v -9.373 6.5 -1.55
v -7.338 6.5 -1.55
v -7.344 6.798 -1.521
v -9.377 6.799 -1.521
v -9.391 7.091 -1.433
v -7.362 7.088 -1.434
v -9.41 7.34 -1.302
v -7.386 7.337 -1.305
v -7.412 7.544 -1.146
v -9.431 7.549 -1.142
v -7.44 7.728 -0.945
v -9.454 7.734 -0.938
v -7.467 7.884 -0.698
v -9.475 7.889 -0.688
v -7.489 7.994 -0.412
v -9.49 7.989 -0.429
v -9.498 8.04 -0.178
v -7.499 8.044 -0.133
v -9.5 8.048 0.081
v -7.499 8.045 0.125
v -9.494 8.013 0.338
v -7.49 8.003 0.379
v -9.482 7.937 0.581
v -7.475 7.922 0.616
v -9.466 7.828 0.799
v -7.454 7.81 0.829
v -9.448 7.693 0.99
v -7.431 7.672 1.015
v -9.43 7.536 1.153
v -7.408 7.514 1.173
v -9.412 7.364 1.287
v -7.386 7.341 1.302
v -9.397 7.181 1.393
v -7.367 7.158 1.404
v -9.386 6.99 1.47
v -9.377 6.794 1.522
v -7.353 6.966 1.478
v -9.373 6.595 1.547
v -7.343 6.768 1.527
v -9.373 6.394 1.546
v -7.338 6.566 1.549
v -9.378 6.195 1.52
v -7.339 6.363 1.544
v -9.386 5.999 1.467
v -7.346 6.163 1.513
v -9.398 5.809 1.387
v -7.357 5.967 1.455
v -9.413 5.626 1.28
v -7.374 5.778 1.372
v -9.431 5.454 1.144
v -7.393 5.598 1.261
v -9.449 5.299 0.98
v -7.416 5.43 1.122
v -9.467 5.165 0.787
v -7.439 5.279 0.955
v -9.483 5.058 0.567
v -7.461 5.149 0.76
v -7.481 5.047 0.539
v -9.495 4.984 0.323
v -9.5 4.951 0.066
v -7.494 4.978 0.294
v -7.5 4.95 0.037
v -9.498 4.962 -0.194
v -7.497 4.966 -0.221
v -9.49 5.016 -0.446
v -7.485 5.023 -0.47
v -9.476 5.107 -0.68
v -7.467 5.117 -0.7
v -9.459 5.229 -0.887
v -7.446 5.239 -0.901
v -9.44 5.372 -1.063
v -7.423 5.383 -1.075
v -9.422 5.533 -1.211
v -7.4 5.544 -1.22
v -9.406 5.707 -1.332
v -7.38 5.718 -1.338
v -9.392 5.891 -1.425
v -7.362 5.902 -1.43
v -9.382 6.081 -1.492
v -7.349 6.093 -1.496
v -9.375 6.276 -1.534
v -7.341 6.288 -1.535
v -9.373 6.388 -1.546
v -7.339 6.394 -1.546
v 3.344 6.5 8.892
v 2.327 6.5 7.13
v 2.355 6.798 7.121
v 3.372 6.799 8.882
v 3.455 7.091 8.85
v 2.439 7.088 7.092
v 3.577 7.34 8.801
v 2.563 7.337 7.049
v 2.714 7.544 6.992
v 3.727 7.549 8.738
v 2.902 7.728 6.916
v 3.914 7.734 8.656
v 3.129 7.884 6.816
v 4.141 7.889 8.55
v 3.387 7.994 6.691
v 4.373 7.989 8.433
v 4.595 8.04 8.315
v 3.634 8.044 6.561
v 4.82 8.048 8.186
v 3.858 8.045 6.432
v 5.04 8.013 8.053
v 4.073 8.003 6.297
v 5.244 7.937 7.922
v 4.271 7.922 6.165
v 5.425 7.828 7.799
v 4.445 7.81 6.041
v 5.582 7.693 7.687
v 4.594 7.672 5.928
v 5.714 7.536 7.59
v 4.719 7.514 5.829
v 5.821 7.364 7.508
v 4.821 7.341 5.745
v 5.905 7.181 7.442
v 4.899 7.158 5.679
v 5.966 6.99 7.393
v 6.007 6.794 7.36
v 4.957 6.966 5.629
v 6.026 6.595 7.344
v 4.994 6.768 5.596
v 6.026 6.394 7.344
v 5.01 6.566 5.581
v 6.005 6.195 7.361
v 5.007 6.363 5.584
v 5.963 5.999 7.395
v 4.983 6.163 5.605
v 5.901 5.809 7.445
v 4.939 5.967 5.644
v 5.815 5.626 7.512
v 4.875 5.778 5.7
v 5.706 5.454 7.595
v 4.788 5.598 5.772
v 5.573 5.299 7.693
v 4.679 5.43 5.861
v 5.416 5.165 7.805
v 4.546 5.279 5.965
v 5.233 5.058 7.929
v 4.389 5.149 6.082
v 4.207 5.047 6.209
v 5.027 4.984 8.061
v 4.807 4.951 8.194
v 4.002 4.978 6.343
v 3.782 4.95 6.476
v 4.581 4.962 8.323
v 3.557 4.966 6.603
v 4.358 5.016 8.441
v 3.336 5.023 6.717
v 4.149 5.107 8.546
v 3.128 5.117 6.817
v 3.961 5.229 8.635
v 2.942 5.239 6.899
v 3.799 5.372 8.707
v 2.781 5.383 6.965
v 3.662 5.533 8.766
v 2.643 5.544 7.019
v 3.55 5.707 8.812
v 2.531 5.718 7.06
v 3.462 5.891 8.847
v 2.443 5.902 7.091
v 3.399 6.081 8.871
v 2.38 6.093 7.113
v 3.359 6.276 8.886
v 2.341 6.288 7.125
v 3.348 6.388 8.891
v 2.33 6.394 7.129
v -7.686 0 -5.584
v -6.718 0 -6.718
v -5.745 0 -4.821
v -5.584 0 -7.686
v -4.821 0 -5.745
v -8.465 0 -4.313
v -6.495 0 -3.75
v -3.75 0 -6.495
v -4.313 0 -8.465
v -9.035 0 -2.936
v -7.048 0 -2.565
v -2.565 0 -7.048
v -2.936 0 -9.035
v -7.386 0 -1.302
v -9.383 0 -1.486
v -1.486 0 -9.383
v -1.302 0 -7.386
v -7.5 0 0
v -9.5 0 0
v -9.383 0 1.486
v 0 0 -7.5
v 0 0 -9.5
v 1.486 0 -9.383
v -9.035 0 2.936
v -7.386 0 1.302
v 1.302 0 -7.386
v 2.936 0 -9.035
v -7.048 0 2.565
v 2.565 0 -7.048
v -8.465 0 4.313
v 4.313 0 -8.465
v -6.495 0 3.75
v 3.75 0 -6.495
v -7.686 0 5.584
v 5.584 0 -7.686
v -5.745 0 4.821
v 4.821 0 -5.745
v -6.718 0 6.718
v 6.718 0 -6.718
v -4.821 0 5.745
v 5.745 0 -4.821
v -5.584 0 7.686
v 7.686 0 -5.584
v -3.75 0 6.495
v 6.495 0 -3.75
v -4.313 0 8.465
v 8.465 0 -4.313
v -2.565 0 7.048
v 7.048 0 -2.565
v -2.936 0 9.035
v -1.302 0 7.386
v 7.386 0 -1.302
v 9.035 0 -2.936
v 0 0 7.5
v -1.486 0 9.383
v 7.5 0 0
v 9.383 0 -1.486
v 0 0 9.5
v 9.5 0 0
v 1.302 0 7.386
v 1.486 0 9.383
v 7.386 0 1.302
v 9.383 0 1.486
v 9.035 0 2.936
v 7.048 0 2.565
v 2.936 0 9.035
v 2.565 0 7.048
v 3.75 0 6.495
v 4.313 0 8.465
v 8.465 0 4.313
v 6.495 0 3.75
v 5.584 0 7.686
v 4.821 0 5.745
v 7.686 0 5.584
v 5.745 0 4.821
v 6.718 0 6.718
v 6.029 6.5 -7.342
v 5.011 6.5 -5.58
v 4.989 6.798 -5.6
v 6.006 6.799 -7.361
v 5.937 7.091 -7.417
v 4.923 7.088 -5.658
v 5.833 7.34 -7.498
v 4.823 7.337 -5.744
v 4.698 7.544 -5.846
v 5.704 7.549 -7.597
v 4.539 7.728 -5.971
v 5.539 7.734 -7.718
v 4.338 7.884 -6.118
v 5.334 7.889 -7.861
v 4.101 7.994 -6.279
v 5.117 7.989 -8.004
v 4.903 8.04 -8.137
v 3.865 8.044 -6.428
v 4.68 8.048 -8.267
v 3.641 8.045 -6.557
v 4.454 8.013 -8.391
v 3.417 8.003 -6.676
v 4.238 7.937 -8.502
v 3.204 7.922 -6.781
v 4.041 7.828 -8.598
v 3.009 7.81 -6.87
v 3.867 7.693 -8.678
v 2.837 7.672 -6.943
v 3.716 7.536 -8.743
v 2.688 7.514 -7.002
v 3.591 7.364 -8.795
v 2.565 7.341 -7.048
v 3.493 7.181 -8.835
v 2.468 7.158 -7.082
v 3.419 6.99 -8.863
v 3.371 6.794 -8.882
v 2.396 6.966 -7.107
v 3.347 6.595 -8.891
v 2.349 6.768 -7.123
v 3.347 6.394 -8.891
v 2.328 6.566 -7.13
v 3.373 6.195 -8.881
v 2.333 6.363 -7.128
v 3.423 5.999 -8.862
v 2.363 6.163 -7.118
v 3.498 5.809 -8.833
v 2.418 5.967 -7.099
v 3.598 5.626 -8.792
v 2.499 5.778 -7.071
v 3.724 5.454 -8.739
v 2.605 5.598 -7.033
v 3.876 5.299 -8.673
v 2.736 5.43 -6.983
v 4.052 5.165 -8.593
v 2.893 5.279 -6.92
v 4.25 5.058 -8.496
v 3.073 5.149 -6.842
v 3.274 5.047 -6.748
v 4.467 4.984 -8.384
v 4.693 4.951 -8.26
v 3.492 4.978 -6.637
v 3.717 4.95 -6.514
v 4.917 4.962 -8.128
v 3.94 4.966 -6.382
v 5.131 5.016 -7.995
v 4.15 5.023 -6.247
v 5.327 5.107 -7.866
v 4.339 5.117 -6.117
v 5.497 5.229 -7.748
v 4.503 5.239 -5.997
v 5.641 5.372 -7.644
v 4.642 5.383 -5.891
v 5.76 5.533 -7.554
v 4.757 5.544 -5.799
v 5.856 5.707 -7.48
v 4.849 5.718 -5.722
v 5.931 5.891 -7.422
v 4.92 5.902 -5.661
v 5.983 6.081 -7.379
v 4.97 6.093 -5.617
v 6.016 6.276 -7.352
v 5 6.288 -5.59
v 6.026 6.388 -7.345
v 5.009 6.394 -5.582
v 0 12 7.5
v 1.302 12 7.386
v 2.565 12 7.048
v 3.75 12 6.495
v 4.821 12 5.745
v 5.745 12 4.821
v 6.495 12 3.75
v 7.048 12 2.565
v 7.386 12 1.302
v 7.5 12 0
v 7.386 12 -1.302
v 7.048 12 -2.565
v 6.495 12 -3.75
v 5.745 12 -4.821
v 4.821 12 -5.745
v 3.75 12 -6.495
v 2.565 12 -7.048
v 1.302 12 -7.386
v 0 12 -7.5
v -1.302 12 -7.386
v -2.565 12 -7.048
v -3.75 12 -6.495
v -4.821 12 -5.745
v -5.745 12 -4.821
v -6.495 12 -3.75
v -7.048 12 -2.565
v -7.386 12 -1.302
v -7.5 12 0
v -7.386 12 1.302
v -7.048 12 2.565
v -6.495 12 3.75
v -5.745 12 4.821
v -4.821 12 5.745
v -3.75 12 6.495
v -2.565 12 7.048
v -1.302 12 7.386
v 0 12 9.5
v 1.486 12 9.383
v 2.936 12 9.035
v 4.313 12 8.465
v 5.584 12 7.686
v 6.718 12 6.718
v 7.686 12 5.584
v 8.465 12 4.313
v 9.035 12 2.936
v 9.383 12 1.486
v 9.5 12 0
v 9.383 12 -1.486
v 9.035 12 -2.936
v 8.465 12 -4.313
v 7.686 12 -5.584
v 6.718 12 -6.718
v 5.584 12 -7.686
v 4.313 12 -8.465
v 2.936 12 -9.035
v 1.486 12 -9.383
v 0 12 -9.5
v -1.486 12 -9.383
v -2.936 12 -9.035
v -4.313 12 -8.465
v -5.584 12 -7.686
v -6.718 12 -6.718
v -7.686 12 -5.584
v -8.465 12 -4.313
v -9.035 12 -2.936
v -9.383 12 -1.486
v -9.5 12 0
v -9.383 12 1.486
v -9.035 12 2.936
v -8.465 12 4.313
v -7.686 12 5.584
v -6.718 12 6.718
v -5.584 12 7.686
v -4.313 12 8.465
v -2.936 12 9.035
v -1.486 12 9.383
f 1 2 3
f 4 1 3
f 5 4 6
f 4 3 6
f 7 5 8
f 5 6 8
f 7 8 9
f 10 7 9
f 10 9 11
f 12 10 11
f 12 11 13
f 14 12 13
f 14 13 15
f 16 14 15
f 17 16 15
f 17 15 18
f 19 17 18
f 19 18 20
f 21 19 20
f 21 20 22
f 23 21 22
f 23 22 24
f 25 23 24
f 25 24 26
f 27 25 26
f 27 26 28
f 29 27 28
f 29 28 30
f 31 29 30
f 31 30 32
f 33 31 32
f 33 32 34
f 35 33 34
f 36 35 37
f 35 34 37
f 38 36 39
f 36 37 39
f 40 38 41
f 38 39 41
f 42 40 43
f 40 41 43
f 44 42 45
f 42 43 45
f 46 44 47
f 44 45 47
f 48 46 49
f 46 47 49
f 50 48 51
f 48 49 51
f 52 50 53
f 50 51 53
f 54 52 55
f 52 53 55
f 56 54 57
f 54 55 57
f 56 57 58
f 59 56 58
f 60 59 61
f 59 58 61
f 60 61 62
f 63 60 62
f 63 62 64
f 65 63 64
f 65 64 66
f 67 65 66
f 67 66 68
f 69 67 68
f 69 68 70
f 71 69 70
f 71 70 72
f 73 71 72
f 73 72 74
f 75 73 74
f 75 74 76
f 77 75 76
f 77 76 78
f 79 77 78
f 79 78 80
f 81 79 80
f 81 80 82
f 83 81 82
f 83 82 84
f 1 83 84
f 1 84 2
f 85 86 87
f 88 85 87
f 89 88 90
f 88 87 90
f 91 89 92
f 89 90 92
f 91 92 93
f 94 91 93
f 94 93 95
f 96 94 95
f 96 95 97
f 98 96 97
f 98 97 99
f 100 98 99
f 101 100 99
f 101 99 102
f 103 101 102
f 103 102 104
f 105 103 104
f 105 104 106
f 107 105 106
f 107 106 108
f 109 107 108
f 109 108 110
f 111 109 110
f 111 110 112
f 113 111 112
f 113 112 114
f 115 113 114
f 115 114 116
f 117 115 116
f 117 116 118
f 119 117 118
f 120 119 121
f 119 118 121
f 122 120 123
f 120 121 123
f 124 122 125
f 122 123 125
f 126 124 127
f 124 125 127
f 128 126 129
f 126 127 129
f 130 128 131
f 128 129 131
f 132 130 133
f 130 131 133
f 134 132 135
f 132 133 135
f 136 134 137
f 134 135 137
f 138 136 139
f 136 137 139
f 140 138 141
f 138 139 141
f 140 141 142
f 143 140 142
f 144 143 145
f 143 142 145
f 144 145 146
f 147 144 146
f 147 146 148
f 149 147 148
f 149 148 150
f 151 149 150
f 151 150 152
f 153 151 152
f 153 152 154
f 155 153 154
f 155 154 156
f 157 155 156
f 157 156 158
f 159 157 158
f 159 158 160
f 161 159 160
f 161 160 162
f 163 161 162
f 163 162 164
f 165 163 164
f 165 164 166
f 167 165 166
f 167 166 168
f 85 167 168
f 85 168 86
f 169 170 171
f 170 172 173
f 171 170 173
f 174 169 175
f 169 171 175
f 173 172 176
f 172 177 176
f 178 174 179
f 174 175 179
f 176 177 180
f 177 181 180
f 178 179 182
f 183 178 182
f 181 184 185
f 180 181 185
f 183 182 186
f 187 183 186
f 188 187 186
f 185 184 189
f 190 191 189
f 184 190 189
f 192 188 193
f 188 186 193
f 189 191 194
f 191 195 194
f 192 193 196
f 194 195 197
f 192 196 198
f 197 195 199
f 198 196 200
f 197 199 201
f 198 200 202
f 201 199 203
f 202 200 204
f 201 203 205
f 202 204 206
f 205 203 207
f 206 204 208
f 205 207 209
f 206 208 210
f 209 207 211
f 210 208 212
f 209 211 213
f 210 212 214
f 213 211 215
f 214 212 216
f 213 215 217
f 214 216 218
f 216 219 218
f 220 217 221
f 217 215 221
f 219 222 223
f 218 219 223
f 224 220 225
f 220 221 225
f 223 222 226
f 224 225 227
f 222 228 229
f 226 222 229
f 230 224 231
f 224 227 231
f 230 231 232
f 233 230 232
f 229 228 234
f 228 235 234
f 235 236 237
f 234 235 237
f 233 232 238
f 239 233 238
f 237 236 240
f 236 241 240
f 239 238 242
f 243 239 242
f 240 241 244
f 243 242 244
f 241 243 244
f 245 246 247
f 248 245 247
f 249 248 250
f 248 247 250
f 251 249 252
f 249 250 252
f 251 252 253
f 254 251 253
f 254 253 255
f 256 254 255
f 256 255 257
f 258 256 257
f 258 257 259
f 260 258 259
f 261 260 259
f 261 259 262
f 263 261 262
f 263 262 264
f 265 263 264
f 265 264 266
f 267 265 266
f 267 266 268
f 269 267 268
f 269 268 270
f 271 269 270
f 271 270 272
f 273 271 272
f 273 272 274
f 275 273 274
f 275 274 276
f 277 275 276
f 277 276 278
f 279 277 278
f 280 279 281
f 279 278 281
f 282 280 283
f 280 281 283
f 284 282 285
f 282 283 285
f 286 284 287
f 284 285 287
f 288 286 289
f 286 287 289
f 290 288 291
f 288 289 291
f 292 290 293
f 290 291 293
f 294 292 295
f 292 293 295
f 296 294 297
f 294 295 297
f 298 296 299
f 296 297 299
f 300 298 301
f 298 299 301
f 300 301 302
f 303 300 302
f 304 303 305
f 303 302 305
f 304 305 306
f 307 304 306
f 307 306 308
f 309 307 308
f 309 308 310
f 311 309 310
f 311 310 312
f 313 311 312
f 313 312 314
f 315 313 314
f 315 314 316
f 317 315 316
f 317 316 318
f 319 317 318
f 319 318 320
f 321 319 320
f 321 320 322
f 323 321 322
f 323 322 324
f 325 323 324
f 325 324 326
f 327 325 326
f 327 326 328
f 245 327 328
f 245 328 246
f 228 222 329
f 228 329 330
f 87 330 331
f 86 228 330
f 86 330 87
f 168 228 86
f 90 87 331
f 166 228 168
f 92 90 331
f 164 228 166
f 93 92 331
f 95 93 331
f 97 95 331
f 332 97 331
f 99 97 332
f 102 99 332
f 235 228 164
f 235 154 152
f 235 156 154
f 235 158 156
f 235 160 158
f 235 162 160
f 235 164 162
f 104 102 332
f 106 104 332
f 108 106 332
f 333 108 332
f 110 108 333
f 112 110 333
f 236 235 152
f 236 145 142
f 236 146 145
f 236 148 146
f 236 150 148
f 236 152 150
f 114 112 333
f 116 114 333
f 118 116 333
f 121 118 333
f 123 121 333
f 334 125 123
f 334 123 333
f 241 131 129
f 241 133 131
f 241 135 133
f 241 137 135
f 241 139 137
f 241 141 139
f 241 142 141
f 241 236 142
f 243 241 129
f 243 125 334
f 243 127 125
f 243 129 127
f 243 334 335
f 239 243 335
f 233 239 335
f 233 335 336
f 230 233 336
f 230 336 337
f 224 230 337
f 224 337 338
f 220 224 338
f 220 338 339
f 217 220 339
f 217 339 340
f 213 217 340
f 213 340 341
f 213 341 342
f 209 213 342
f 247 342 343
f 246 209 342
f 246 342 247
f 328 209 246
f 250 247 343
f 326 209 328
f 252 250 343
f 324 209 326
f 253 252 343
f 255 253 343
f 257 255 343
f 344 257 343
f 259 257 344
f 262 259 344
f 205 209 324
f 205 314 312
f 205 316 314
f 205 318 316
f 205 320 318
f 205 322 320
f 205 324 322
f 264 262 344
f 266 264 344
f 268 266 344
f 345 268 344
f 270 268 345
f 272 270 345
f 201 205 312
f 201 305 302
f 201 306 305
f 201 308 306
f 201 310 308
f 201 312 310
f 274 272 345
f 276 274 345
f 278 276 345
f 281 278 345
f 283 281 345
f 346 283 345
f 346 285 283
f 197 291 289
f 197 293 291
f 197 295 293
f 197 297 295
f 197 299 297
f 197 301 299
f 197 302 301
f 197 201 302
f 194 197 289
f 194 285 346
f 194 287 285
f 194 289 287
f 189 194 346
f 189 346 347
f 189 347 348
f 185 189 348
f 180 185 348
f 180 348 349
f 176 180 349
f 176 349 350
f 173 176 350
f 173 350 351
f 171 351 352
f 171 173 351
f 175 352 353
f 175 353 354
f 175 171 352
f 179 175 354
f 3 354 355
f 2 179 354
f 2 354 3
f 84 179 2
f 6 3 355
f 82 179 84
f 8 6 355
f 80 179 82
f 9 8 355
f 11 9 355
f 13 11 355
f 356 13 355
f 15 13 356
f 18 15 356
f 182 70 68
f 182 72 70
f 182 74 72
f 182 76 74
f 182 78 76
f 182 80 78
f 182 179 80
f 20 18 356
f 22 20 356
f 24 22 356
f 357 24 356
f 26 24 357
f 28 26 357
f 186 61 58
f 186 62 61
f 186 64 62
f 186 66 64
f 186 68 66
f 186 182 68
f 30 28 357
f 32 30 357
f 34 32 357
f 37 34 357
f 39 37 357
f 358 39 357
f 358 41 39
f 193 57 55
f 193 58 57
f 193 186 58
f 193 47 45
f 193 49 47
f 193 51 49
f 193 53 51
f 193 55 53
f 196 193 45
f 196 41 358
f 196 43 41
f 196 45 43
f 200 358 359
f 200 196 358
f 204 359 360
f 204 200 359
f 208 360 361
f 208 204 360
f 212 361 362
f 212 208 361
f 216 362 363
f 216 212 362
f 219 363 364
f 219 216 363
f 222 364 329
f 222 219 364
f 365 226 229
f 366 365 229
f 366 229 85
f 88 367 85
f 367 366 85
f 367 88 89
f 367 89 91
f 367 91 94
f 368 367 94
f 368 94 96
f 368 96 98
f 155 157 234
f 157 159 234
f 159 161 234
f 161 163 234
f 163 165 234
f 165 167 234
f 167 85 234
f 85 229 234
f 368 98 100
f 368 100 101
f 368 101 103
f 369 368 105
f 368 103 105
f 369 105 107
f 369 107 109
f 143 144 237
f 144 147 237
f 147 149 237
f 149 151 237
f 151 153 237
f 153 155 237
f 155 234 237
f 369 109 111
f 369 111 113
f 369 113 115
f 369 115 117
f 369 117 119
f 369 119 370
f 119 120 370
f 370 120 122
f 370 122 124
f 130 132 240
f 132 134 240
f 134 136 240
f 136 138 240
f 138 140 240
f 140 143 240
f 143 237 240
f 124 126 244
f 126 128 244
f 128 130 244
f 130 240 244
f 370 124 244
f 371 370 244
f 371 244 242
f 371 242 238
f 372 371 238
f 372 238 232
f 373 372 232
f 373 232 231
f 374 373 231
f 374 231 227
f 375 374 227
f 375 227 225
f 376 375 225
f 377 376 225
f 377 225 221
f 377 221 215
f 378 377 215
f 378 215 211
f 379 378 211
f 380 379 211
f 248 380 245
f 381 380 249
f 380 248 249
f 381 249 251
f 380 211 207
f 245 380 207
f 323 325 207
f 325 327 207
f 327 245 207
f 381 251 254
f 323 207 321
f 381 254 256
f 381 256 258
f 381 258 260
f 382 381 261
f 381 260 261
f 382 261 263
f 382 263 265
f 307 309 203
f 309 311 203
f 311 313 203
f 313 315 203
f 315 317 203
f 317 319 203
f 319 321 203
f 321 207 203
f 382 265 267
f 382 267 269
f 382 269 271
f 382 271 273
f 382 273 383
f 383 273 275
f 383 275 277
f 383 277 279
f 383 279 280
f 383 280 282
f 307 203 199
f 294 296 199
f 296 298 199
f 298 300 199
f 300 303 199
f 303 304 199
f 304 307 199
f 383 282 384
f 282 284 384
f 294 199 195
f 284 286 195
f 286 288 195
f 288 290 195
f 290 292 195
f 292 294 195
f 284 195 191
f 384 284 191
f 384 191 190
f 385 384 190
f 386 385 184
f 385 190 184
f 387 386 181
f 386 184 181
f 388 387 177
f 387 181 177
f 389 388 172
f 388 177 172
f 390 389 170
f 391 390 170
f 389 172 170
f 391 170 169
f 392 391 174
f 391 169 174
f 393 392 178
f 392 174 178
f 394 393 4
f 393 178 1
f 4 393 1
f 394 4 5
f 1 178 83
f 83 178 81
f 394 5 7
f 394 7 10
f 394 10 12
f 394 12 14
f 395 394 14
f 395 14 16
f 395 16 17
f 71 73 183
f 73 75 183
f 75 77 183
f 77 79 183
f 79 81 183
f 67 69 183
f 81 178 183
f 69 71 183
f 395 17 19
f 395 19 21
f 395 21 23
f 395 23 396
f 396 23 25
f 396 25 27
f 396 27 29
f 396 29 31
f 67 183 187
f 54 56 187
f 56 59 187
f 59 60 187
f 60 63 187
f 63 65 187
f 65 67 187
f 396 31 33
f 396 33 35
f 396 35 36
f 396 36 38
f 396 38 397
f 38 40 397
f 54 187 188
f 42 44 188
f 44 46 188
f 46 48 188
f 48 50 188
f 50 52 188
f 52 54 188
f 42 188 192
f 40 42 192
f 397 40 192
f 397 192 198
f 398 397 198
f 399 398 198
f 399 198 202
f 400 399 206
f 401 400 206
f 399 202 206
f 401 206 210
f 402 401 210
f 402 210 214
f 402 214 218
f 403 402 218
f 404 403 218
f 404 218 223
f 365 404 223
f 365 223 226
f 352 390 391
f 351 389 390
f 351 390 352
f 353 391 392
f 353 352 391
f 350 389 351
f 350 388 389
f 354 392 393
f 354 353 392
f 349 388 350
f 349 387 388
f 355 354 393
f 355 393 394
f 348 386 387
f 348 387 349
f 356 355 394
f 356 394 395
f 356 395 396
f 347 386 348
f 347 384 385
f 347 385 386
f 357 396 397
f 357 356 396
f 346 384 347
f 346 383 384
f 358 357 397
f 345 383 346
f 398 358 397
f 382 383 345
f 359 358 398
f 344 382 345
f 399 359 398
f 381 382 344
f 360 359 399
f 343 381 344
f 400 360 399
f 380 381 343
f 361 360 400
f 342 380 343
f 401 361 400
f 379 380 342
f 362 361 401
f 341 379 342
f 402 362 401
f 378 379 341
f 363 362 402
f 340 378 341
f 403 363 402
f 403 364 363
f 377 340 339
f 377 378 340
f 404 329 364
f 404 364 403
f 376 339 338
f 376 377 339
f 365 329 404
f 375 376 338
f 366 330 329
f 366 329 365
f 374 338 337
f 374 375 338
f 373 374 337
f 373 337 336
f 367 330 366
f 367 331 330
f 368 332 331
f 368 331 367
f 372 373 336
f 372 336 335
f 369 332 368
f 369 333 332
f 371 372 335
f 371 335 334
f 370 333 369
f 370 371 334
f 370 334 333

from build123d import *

# Parameters (mm, degrees)
SKETCH_1_R               = 9.5
SKETCH_1_R_2             = 7.5
EXTRUDE_1_DEPTH          = 12
CUT_EXTRUDE_1_REACH      = 20.014
CUT_EXTRUDE_1_END_RADIUS = 9.5
SKETCH_2_R               = 1.55
PATTERN_CIRCULAR_1_COUNT = 3


with BuildPart() as part:
    # 草图1 → 凸台-拉伸1 (new body)
    with BuildSketch(Plane(origin=(0, 0, 0), x_dir=(1, 0, 0), z_dir=(0, 1, 0))):
        with Locations(Location((0, 0, 0), (0, 0, 270))):
            Circle(SKETCH_1_R)
        with Locations(Location((0, 0, 0), (0, 0, 270))):
            Circle(SKETCH_1_R_2, mode=Mode.SUBTRACT)
    extrude(amount=EXTRUDE_1_DEPTH)

    # 切除-拉伸1: up to this cylinder (the profile starts inside it)
    cut_extrude_1_end = Plane(origin=(0, 6.5, 0), z_dir=(0, -1, 0)) * Cylinder(CUT_EXTRUDE_1_END_RADIUS, 60.028, mode=Mode.PRIVATE)
    # 草图2 → 切除-拉伸1 (cut, up to the surface)
    with BuildSketch(Plane(origin=(0, 0, 0), x_dir=(0, 0, -1), z_dir=(1, 0, 0)), mode=Mode.PRIVATE) as cut_extrude_1_sk1:
        with Locations((0, 6.5)):
            Circle(SKETCH_2_R)
    cut_extrude_1_tool1 = extrude(cut_extrude_1_sk1.sketch, amount=-CUT_EXTRUDE_1_REACH, mode=Mode.PRIVATE) & cut_extrude_1_end
    cut_extrude_1 = cut_extrude_1_tool1.solids().sort_by_distance((0, 6.5, 0))[0]
    add(cut_extrude_1, mode=Mode.SUBTRACT)

    # 阵列(圆周)1: 切除-拉伸1 ×3 about axis
    pattern_circular_1_axis = Axis((0, 12, 0), (0, 1, 0))
    for i in range(1, PATTERN_CIRCULAR_1_COUNT):
        add(cut_extrude_1.rotate(pattern_circular_1_axis, i * 360 / PATTERN_CIRCULAR_1_COUNT), mode=Mode.SUBTRACT)


solid = part.part
